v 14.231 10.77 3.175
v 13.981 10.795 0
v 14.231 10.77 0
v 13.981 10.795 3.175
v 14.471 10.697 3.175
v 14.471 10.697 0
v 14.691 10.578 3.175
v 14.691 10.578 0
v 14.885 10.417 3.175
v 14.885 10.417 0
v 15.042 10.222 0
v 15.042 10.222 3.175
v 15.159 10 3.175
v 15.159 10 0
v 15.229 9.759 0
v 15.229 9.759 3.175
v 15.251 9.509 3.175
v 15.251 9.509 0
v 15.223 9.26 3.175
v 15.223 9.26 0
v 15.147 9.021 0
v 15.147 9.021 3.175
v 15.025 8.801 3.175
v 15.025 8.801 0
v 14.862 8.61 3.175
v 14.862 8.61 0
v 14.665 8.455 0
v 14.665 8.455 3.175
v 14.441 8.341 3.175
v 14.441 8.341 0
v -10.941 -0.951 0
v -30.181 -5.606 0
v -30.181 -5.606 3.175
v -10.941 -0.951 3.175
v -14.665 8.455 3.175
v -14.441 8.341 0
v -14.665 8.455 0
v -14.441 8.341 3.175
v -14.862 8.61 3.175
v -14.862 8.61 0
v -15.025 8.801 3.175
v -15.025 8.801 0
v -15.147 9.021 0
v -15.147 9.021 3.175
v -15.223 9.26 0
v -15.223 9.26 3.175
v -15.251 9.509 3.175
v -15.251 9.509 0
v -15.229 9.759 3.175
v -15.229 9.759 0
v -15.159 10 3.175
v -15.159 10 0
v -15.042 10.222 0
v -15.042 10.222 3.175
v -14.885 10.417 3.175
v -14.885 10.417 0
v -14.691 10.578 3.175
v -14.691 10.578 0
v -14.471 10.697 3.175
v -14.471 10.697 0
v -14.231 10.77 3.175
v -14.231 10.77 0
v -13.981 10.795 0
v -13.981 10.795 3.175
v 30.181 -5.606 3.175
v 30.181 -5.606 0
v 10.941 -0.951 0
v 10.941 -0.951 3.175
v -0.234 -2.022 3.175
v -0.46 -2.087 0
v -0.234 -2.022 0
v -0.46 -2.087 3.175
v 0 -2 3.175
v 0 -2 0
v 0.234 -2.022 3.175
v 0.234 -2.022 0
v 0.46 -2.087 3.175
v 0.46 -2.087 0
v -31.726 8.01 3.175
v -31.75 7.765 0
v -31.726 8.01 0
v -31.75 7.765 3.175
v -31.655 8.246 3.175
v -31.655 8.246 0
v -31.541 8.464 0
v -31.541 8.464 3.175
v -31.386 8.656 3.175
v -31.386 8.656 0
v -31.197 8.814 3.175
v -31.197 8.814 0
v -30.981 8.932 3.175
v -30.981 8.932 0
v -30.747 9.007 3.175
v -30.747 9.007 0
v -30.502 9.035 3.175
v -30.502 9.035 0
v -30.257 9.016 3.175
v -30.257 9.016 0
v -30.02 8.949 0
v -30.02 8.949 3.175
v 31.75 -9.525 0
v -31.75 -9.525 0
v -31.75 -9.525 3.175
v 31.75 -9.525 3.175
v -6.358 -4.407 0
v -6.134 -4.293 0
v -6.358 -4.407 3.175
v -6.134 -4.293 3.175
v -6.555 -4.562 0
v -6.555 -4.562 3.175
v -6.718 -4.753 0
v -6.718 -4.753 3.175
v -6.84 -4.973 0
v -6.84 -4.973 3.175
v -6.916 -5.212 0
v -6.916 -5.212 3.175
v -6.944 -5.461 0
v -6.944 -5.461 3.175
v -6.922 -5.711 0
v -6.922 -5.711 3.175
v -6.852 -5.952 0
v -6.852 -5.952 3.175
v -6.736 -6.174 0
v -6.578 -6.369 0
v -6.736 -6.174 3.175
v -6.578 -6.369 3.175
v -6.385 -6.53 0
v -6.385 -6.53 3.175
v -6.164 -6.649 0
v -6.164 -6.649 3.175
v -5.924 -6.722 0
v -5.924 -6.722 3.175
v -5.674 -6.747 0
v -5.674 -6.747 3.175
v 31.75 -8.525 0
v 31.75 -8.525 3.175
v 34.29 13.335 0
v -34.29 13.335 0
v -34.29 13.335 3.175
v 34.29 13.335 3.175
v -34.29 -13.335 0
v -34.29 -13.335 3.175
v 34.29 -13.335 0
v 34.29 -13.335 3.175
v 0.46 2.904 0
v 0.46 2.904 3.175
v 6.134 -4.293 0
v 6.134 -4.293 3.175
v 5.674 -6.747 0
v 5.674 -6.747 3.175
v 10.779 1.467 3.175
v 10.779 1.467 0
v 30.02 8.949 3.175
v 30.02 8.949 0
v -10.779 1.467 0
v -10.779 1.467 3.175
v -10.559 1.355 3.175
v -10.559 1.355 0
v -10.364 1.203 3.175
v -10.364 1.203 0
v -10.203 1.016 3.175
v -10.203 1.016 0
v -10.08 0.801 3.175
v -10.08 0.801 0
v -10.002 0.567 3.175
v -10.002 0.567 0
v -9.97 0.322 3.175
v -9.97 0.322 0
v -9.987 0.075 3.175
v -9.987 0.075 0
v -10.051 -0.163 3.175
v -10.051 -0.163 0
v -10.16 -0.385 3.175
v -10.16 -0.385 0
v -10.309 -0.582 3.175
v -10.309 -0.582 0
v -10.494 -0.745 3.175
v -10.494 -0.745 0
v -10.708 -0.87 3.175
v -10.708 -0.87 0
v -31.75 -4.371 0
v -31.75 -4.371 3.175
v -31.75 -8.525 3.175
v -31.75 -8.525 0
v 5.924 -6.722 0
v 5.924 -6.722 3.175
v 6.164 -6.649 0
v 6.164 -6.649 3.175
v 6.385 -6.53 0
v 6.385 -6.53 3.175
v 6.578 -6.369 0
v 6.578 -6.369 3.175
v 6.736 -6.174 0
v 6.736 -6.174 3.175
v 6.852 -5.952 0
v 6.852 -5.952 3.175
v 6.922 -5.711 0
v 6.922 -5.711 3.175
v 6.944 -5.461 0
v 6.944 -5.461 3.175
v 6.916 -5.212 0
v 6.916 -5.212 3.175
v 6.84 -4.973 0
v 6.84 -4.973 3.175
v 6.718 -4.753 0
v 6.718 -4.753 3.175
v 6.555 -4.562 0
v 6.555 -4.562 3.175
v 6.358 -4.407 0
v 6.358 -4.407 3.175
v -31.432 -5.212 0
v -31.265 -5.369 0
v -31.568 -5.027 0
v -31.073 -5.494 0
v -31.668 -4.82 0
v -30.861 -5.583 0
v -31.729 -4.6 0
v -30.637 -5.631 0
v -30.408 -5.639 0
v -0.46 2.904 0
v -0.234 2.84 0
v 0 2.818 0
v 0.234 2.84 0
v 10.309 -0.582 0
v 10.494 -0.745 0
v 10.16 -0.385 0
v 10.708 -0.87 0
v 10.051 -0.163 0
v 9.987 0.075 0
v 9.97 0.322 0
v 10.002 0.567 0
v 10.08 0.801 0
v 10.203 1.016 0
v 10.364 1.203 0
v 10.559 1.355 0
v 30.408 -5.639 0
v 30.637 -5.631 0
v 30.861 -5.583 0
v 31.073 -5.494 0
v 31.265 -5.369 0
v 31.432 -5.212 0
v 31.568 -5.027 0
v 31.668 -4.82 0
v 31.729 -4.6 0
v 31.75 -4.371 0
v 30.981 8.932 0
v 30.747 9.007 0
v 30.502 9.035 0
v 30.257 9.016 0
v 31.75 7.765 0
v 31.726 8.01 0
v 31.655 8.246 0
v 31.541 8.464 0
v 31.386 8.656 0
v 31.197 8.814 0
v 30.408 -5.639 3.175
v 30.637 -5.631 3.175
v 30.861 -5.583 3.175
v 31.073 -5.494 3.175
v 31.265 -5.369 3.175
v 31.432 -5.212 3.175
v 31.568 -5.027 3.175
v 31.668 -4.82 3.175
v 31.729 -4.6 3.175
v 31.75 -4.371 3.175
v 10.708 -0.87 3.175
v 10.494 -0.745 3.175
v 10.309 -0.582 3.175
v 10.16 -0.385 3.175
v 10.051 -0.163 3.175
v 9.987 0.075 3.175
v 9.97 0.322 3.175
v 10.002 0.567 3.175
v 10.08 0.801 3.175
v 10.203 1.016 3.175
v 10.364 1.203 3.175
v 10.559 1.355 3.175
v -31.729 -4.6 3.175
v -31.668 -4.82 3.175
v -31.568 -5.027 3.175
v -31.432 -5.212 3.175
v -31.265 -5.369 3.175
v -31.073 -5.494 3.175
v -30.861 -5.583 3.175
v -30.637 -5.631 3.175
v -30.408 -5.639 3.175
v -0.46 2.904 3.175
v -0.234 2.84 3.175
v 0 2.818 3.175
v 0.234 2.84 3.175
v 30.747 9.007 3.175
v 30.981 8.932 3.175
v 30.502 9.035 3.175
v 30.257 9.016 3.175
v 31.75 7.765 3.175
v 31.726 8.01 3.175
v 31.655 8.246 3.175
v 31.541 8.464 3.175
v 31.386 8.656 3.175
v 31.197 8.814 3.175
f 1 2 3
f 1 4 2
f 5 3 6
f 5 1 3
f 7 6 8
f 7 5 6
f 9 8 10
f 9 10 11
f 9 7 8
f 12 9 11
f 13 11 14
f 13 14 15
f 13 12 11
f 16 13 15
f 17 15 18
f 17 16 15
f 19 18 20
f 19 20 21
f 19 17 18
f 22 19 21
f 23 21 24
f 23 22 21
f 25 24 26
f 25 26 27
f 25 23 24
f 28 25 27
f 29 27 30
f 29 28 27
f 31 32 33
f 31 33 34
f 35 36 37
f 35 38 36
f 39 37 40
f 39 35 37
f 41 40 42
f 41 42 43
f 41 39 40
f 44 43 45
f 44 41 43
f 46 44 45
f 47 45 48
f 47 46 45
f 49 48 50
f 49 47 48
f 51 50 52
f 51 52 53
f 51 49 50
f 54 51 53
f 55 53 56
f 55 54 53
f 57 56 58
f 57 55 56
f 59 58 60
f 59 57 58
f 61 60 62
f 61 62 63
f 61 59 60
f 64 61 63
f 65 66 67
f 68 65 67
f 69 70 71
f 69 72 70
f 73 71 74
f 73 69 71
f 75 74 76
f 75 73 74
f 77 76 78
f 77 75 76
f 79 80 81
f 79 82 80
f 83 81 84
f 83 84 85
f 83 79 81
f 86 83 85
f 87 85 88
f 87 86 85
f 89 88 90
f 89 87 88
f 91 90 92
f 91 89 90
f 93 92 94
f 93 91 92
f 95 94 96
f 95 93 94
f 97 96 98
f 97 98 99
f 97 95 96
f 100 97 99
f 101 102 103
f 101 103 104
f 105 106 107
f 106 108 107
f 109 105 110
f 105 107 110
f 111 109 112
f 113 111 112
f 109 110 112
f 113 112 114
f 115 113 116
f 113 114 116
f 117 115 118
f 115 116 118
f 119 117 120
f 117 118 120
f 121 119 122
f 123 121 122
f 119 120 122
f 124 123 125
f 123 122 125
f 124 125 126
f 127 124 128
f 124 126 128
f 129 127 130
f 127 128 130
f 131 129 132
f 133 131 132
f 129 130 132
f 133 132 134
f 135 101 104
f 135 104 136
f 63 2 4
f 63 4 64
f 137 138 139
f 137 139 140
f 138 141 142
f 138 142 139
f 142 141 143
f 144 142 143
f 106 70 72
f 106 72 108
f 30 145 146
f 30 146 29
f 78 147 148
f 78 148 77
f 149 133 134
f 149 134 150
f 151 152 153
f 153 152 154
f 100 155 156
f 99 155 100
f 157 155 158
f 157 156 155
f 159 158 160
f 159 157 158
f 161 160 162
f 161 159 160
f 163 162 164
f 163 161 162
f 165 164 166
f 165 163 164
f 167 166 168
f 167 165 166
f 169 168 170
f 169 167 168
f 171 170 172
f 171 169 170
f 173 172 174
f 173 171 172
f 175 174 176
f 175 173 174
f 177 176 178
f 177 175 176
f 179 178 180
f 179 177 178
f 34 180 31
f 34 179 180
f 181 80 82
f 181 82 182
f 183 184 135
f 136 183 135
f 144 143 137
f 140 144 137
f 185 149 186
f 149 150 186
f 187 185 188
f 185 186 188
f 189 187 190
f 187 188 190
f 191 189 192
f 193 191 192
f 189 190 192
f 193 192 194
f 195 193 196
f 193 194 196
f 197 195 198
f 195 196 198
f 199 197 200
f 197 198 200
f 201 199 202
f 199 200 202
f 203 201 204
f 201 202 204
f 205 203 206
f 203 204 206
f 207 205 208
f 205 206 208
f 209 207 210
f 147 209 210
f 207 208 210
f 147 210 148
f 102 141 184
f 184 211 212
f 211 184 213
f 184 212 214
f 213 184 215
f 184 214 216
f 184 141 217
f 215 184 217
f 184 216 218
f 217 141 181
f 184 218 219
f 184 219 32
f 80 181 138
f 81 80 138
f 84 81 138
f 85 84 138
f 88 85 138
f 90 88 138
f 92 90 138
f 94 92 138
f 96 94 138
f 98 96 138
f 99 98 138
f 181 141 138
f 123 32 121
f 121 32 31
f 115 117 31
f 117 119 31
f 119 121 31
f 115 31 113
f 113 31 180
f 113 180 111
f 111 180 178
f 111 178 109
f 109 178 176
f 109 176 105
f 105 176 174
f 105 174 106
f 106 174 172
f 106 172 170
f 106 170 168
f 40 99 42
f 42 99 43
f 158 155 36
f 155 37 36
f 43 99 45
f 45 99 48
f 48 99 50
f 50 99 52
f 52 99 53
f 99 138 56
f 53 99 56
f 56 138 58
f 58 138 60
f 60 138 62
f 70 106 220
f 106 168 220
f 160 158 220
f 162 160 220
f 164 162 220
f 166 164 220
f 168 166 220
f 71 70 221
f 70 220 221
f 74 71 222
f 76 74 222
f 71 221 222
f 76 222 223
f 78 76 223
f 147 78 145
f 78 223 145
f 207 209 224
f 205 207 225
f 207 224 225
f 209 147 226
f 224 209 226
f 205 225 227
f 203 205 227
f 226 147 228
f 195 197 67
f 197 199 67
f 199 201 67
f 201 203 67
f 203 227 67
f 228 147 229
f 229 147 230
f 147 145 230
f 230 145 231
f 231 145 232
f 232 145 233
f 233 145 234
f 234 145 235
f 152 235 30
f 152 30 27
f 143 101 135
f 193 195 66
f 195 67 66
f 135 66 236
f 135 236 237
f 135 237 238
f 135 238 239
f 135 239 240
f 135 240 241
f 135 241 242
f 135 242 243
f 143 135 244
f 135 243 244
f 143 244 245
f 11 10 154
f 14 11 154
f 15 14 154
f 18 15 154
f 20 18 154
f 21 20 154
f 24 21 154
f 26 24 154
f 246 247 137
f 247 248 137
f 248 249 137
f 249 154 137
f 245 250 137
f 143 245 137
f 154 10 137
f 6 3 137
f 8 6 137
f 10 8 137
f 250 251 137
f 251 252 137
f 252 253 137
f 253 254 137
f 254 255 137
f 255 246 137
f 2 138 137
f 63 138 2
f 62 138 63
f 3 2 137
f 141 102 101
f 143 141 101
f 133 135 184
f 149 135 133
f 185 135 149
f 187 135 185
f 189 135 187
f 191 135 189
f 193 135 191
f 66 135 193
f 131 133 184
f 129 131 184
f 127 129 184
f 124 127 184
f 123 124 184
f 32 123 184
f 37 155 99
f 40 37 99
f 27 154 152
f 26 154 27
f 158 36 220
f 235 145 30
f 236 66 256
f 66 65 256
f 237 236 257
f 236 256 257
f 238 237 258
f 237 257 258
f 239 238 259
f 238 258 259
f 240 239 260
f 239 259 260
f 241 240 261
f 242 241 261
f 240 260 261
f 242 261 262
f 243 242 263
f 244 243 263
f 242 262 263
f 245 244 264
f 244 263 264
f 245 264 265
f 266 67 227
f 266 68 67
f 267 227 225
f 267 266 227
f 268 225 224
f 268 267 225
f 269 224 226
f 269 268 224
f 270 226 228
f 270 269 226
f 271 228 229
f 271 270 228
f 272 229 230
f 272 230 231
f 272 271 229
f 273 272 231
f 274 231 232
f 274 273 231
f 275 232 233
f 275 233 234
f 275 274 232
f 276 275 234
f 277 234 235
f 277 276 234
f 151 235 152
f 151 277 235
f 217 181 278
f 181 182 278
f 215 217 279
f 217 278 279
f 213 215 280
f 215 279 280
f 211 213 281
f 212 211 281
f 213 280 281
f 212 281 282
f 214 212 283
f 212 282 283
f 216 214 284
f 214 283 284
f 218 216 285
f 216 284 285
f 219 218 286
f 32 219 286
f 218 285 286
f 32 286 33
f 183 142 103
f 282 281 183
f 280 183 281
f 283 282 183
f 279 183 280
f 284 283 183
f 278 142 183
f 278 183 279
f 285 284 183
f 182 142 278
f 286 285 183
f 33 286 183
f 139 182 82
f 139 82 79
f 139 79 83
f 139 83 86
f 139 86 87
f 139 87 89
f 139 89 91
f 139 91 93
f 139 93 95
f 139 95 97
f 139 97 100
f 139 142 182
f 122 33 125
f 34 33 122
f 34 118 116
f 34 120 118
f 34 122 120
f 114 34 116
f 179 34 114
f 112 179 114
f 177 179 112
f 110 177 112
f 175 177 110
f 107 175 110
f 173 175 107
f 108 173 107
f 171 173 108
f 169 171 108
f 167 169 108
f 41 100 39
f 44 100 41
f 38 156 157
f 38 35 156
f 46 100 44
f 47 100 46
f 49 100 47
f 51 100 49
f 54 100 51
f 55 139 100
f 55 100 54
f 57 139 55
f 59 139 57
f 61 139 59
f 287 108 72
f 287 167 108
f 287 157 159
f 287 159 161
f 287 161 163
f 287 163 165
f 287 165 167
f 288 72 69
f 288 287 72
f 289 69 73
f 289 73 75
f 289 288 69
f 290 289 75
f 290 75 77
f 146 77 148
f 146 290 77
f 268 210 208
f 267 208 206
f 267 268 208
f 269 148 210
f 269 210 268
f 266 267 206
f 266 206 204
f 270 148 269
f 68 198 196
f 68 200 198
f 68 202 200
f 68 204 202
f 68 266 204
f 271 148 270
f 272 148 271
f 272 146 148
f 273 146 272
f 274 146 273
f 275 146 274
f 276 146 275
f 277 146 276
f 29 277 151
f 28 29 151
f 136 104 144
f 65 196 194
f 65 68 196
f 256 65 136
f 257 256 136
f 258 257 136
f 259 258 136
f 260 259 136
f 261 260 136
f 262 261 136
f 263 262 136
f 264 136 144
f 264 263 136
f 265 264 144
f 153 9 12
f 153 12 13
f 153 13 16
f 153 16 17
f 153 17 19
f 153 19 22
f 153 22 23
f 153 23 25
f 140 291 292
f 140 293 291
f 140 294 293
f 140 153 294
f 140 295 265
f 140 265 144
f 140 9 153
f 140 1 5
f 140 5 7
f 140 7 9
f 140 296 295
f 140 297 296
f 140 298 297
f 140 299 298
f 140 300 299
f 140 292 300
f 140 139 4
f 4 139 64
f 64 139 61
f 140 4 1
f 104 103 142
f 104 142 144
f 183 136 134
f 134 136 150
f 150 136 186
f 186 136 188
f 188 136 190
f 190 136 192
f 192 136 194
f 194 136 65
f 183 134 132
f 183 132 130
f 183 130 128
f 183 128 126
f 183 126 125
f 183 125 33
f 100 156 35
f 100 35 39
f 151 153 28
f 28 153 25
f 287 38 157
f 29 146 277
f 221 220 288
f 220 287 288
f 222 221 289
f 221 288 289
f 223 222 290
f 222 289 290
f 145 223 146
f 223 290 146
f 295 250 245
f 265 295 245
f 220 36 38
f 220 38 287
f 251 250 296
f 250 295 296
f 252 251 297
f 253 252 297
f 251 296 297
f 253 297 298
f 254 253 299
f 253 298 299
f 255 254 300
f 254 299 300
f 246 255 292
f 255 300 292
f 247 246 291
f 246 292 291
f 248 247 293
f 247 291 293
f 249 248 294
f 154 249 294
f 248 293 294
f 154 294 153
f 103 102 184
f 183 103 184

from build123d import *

# Parameters (mm, degrees)
SKETCH1_W           = 68.58
SKETCH1_H           = 26.67
SKETCH1_W_2         = 63.5
SKETCH1_H_2         = 1
BOSS_EXTRUDE1_DEPTH = 3.175
FILLET1_R           = 1.27


with BuildPart() as part:
    # Sketch1 → Boss-Extrude1 (new body)
    with BuildSketch(Plane.XY):
        Rectangle(SKETCH1_W, SKETCH1_H)
        Polygon((-20.750635985, 10.795), (0, 2.725308228), (20.750635985, 10.795), align=None, mode=Mode.SUBTRACT)
        with Locations((0, -9.025)):
            Rectangle(SKETCH1_W_2, SKETCH1_H_2, mode=Mode.SUBTRACT)
        Polygon((-31.75, 9.621913994), (-31.75, -5.985), (-7.007935444, 0), align=None, mode=Mode.SUBTRACT)
        Polygon((7.007935444, 0), (31.75, 9.621913994), (31.75, -5.985), align=None, mode=Mode.SUBTRACT)
        Polygon((0, -1.90771576), (-12.443873761, -6.747), (12.443873761, -6.747), align=None, mode=Mode.SUBTRACT)
    extrude(amount=BOSS_EXTRUDE1_DEPTH)

    # Fillet1
    fillet1_edges = [part.edges().sort_by_distance(p)[0] for p in [
        (20.750635985, 10.795, 1.5875),
        (-20.750635985, 10.795, 1.5875),
        (0, 2.725308228, 1.5875),
        (-7.007935444, 0, 1.5875),
        (-31.75, 9.621913994, 1.5875),
        (-31.75, -5.985, 1.5875),
        (7.007935444, 0, 1.5875),
        (31.75, -5.985, 1.5875),
        (31.75, 9.621913994, 1.5875),
        (12.443873761, -6.747, 1.5875),
        (0, -1.90771576, 1.5875),
        (-12.443873761, -6.747, 1.5875),
    ]]
    fillet(fillet1_edges, radius=FILLET1_R)


solid = part.part
